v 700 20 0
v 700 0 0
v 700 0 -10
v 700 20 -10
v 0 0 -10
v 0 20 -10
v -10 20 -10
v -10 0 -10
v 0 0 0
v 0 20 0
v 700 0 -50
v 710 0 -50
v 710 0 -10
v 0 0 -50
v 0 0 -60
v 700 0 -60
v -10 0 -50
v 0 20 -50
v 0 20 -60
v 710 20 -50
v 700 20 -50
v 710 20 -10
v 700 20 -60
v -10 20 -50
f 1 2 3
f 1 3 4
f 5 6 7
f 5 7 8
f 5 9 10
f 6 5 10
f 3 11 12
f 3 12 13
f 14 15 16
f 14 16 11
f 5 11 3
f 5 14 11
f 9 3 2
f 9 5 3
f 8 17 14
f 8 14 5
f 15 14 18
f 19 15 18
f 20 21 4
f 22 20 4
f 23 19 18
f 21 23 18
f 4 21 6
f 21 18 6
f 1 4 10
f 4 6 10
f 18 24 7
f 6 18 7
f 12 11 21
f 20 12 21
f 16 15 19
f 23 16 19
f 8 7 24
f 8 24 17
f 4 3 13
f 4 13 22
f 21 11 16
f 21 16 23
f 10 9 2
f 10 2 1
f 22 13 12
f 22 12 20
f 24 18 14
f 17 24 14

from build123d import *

# Parameters (mm, degrees)
F0_W     = 20
F0_H     = 60
F1_DEPTH = 700
F2_W     = 20
F2_H     = 40
F3_DEPTH = 10
F4_W     = 20
F4_H     = 40
F5_DEPTH = 10


with BuildPart() as f1:
    # F0 (on Right) → F1 (new body)
    with BuildSketch(Plane.YZ):
        with Locations((10, -30)):
            Rectangle(F0_W, F0_H)
    extrude(amount=F1_DEPTH)

    # F2 (on face) → F3 (join)
    with BuildSketch(Plane(origin=(0, 0, 0), x_dir=(0, -1, 0), z_dir=(-1, 0, 0))):
        with Locations((-10, -30)):
            Rectangle(F2_W, F2_H)
    extrude(amount=F3_DEPTH)

    # F4 (on face) → F5 (join)
    with BuildSketch(Plane.YZ.offset(700)):
        with Locations((10, -30)):
            Rectangle(F4_W, F4_H)
    extrude(amount=F5_DEPTH)


solid = f1.part
